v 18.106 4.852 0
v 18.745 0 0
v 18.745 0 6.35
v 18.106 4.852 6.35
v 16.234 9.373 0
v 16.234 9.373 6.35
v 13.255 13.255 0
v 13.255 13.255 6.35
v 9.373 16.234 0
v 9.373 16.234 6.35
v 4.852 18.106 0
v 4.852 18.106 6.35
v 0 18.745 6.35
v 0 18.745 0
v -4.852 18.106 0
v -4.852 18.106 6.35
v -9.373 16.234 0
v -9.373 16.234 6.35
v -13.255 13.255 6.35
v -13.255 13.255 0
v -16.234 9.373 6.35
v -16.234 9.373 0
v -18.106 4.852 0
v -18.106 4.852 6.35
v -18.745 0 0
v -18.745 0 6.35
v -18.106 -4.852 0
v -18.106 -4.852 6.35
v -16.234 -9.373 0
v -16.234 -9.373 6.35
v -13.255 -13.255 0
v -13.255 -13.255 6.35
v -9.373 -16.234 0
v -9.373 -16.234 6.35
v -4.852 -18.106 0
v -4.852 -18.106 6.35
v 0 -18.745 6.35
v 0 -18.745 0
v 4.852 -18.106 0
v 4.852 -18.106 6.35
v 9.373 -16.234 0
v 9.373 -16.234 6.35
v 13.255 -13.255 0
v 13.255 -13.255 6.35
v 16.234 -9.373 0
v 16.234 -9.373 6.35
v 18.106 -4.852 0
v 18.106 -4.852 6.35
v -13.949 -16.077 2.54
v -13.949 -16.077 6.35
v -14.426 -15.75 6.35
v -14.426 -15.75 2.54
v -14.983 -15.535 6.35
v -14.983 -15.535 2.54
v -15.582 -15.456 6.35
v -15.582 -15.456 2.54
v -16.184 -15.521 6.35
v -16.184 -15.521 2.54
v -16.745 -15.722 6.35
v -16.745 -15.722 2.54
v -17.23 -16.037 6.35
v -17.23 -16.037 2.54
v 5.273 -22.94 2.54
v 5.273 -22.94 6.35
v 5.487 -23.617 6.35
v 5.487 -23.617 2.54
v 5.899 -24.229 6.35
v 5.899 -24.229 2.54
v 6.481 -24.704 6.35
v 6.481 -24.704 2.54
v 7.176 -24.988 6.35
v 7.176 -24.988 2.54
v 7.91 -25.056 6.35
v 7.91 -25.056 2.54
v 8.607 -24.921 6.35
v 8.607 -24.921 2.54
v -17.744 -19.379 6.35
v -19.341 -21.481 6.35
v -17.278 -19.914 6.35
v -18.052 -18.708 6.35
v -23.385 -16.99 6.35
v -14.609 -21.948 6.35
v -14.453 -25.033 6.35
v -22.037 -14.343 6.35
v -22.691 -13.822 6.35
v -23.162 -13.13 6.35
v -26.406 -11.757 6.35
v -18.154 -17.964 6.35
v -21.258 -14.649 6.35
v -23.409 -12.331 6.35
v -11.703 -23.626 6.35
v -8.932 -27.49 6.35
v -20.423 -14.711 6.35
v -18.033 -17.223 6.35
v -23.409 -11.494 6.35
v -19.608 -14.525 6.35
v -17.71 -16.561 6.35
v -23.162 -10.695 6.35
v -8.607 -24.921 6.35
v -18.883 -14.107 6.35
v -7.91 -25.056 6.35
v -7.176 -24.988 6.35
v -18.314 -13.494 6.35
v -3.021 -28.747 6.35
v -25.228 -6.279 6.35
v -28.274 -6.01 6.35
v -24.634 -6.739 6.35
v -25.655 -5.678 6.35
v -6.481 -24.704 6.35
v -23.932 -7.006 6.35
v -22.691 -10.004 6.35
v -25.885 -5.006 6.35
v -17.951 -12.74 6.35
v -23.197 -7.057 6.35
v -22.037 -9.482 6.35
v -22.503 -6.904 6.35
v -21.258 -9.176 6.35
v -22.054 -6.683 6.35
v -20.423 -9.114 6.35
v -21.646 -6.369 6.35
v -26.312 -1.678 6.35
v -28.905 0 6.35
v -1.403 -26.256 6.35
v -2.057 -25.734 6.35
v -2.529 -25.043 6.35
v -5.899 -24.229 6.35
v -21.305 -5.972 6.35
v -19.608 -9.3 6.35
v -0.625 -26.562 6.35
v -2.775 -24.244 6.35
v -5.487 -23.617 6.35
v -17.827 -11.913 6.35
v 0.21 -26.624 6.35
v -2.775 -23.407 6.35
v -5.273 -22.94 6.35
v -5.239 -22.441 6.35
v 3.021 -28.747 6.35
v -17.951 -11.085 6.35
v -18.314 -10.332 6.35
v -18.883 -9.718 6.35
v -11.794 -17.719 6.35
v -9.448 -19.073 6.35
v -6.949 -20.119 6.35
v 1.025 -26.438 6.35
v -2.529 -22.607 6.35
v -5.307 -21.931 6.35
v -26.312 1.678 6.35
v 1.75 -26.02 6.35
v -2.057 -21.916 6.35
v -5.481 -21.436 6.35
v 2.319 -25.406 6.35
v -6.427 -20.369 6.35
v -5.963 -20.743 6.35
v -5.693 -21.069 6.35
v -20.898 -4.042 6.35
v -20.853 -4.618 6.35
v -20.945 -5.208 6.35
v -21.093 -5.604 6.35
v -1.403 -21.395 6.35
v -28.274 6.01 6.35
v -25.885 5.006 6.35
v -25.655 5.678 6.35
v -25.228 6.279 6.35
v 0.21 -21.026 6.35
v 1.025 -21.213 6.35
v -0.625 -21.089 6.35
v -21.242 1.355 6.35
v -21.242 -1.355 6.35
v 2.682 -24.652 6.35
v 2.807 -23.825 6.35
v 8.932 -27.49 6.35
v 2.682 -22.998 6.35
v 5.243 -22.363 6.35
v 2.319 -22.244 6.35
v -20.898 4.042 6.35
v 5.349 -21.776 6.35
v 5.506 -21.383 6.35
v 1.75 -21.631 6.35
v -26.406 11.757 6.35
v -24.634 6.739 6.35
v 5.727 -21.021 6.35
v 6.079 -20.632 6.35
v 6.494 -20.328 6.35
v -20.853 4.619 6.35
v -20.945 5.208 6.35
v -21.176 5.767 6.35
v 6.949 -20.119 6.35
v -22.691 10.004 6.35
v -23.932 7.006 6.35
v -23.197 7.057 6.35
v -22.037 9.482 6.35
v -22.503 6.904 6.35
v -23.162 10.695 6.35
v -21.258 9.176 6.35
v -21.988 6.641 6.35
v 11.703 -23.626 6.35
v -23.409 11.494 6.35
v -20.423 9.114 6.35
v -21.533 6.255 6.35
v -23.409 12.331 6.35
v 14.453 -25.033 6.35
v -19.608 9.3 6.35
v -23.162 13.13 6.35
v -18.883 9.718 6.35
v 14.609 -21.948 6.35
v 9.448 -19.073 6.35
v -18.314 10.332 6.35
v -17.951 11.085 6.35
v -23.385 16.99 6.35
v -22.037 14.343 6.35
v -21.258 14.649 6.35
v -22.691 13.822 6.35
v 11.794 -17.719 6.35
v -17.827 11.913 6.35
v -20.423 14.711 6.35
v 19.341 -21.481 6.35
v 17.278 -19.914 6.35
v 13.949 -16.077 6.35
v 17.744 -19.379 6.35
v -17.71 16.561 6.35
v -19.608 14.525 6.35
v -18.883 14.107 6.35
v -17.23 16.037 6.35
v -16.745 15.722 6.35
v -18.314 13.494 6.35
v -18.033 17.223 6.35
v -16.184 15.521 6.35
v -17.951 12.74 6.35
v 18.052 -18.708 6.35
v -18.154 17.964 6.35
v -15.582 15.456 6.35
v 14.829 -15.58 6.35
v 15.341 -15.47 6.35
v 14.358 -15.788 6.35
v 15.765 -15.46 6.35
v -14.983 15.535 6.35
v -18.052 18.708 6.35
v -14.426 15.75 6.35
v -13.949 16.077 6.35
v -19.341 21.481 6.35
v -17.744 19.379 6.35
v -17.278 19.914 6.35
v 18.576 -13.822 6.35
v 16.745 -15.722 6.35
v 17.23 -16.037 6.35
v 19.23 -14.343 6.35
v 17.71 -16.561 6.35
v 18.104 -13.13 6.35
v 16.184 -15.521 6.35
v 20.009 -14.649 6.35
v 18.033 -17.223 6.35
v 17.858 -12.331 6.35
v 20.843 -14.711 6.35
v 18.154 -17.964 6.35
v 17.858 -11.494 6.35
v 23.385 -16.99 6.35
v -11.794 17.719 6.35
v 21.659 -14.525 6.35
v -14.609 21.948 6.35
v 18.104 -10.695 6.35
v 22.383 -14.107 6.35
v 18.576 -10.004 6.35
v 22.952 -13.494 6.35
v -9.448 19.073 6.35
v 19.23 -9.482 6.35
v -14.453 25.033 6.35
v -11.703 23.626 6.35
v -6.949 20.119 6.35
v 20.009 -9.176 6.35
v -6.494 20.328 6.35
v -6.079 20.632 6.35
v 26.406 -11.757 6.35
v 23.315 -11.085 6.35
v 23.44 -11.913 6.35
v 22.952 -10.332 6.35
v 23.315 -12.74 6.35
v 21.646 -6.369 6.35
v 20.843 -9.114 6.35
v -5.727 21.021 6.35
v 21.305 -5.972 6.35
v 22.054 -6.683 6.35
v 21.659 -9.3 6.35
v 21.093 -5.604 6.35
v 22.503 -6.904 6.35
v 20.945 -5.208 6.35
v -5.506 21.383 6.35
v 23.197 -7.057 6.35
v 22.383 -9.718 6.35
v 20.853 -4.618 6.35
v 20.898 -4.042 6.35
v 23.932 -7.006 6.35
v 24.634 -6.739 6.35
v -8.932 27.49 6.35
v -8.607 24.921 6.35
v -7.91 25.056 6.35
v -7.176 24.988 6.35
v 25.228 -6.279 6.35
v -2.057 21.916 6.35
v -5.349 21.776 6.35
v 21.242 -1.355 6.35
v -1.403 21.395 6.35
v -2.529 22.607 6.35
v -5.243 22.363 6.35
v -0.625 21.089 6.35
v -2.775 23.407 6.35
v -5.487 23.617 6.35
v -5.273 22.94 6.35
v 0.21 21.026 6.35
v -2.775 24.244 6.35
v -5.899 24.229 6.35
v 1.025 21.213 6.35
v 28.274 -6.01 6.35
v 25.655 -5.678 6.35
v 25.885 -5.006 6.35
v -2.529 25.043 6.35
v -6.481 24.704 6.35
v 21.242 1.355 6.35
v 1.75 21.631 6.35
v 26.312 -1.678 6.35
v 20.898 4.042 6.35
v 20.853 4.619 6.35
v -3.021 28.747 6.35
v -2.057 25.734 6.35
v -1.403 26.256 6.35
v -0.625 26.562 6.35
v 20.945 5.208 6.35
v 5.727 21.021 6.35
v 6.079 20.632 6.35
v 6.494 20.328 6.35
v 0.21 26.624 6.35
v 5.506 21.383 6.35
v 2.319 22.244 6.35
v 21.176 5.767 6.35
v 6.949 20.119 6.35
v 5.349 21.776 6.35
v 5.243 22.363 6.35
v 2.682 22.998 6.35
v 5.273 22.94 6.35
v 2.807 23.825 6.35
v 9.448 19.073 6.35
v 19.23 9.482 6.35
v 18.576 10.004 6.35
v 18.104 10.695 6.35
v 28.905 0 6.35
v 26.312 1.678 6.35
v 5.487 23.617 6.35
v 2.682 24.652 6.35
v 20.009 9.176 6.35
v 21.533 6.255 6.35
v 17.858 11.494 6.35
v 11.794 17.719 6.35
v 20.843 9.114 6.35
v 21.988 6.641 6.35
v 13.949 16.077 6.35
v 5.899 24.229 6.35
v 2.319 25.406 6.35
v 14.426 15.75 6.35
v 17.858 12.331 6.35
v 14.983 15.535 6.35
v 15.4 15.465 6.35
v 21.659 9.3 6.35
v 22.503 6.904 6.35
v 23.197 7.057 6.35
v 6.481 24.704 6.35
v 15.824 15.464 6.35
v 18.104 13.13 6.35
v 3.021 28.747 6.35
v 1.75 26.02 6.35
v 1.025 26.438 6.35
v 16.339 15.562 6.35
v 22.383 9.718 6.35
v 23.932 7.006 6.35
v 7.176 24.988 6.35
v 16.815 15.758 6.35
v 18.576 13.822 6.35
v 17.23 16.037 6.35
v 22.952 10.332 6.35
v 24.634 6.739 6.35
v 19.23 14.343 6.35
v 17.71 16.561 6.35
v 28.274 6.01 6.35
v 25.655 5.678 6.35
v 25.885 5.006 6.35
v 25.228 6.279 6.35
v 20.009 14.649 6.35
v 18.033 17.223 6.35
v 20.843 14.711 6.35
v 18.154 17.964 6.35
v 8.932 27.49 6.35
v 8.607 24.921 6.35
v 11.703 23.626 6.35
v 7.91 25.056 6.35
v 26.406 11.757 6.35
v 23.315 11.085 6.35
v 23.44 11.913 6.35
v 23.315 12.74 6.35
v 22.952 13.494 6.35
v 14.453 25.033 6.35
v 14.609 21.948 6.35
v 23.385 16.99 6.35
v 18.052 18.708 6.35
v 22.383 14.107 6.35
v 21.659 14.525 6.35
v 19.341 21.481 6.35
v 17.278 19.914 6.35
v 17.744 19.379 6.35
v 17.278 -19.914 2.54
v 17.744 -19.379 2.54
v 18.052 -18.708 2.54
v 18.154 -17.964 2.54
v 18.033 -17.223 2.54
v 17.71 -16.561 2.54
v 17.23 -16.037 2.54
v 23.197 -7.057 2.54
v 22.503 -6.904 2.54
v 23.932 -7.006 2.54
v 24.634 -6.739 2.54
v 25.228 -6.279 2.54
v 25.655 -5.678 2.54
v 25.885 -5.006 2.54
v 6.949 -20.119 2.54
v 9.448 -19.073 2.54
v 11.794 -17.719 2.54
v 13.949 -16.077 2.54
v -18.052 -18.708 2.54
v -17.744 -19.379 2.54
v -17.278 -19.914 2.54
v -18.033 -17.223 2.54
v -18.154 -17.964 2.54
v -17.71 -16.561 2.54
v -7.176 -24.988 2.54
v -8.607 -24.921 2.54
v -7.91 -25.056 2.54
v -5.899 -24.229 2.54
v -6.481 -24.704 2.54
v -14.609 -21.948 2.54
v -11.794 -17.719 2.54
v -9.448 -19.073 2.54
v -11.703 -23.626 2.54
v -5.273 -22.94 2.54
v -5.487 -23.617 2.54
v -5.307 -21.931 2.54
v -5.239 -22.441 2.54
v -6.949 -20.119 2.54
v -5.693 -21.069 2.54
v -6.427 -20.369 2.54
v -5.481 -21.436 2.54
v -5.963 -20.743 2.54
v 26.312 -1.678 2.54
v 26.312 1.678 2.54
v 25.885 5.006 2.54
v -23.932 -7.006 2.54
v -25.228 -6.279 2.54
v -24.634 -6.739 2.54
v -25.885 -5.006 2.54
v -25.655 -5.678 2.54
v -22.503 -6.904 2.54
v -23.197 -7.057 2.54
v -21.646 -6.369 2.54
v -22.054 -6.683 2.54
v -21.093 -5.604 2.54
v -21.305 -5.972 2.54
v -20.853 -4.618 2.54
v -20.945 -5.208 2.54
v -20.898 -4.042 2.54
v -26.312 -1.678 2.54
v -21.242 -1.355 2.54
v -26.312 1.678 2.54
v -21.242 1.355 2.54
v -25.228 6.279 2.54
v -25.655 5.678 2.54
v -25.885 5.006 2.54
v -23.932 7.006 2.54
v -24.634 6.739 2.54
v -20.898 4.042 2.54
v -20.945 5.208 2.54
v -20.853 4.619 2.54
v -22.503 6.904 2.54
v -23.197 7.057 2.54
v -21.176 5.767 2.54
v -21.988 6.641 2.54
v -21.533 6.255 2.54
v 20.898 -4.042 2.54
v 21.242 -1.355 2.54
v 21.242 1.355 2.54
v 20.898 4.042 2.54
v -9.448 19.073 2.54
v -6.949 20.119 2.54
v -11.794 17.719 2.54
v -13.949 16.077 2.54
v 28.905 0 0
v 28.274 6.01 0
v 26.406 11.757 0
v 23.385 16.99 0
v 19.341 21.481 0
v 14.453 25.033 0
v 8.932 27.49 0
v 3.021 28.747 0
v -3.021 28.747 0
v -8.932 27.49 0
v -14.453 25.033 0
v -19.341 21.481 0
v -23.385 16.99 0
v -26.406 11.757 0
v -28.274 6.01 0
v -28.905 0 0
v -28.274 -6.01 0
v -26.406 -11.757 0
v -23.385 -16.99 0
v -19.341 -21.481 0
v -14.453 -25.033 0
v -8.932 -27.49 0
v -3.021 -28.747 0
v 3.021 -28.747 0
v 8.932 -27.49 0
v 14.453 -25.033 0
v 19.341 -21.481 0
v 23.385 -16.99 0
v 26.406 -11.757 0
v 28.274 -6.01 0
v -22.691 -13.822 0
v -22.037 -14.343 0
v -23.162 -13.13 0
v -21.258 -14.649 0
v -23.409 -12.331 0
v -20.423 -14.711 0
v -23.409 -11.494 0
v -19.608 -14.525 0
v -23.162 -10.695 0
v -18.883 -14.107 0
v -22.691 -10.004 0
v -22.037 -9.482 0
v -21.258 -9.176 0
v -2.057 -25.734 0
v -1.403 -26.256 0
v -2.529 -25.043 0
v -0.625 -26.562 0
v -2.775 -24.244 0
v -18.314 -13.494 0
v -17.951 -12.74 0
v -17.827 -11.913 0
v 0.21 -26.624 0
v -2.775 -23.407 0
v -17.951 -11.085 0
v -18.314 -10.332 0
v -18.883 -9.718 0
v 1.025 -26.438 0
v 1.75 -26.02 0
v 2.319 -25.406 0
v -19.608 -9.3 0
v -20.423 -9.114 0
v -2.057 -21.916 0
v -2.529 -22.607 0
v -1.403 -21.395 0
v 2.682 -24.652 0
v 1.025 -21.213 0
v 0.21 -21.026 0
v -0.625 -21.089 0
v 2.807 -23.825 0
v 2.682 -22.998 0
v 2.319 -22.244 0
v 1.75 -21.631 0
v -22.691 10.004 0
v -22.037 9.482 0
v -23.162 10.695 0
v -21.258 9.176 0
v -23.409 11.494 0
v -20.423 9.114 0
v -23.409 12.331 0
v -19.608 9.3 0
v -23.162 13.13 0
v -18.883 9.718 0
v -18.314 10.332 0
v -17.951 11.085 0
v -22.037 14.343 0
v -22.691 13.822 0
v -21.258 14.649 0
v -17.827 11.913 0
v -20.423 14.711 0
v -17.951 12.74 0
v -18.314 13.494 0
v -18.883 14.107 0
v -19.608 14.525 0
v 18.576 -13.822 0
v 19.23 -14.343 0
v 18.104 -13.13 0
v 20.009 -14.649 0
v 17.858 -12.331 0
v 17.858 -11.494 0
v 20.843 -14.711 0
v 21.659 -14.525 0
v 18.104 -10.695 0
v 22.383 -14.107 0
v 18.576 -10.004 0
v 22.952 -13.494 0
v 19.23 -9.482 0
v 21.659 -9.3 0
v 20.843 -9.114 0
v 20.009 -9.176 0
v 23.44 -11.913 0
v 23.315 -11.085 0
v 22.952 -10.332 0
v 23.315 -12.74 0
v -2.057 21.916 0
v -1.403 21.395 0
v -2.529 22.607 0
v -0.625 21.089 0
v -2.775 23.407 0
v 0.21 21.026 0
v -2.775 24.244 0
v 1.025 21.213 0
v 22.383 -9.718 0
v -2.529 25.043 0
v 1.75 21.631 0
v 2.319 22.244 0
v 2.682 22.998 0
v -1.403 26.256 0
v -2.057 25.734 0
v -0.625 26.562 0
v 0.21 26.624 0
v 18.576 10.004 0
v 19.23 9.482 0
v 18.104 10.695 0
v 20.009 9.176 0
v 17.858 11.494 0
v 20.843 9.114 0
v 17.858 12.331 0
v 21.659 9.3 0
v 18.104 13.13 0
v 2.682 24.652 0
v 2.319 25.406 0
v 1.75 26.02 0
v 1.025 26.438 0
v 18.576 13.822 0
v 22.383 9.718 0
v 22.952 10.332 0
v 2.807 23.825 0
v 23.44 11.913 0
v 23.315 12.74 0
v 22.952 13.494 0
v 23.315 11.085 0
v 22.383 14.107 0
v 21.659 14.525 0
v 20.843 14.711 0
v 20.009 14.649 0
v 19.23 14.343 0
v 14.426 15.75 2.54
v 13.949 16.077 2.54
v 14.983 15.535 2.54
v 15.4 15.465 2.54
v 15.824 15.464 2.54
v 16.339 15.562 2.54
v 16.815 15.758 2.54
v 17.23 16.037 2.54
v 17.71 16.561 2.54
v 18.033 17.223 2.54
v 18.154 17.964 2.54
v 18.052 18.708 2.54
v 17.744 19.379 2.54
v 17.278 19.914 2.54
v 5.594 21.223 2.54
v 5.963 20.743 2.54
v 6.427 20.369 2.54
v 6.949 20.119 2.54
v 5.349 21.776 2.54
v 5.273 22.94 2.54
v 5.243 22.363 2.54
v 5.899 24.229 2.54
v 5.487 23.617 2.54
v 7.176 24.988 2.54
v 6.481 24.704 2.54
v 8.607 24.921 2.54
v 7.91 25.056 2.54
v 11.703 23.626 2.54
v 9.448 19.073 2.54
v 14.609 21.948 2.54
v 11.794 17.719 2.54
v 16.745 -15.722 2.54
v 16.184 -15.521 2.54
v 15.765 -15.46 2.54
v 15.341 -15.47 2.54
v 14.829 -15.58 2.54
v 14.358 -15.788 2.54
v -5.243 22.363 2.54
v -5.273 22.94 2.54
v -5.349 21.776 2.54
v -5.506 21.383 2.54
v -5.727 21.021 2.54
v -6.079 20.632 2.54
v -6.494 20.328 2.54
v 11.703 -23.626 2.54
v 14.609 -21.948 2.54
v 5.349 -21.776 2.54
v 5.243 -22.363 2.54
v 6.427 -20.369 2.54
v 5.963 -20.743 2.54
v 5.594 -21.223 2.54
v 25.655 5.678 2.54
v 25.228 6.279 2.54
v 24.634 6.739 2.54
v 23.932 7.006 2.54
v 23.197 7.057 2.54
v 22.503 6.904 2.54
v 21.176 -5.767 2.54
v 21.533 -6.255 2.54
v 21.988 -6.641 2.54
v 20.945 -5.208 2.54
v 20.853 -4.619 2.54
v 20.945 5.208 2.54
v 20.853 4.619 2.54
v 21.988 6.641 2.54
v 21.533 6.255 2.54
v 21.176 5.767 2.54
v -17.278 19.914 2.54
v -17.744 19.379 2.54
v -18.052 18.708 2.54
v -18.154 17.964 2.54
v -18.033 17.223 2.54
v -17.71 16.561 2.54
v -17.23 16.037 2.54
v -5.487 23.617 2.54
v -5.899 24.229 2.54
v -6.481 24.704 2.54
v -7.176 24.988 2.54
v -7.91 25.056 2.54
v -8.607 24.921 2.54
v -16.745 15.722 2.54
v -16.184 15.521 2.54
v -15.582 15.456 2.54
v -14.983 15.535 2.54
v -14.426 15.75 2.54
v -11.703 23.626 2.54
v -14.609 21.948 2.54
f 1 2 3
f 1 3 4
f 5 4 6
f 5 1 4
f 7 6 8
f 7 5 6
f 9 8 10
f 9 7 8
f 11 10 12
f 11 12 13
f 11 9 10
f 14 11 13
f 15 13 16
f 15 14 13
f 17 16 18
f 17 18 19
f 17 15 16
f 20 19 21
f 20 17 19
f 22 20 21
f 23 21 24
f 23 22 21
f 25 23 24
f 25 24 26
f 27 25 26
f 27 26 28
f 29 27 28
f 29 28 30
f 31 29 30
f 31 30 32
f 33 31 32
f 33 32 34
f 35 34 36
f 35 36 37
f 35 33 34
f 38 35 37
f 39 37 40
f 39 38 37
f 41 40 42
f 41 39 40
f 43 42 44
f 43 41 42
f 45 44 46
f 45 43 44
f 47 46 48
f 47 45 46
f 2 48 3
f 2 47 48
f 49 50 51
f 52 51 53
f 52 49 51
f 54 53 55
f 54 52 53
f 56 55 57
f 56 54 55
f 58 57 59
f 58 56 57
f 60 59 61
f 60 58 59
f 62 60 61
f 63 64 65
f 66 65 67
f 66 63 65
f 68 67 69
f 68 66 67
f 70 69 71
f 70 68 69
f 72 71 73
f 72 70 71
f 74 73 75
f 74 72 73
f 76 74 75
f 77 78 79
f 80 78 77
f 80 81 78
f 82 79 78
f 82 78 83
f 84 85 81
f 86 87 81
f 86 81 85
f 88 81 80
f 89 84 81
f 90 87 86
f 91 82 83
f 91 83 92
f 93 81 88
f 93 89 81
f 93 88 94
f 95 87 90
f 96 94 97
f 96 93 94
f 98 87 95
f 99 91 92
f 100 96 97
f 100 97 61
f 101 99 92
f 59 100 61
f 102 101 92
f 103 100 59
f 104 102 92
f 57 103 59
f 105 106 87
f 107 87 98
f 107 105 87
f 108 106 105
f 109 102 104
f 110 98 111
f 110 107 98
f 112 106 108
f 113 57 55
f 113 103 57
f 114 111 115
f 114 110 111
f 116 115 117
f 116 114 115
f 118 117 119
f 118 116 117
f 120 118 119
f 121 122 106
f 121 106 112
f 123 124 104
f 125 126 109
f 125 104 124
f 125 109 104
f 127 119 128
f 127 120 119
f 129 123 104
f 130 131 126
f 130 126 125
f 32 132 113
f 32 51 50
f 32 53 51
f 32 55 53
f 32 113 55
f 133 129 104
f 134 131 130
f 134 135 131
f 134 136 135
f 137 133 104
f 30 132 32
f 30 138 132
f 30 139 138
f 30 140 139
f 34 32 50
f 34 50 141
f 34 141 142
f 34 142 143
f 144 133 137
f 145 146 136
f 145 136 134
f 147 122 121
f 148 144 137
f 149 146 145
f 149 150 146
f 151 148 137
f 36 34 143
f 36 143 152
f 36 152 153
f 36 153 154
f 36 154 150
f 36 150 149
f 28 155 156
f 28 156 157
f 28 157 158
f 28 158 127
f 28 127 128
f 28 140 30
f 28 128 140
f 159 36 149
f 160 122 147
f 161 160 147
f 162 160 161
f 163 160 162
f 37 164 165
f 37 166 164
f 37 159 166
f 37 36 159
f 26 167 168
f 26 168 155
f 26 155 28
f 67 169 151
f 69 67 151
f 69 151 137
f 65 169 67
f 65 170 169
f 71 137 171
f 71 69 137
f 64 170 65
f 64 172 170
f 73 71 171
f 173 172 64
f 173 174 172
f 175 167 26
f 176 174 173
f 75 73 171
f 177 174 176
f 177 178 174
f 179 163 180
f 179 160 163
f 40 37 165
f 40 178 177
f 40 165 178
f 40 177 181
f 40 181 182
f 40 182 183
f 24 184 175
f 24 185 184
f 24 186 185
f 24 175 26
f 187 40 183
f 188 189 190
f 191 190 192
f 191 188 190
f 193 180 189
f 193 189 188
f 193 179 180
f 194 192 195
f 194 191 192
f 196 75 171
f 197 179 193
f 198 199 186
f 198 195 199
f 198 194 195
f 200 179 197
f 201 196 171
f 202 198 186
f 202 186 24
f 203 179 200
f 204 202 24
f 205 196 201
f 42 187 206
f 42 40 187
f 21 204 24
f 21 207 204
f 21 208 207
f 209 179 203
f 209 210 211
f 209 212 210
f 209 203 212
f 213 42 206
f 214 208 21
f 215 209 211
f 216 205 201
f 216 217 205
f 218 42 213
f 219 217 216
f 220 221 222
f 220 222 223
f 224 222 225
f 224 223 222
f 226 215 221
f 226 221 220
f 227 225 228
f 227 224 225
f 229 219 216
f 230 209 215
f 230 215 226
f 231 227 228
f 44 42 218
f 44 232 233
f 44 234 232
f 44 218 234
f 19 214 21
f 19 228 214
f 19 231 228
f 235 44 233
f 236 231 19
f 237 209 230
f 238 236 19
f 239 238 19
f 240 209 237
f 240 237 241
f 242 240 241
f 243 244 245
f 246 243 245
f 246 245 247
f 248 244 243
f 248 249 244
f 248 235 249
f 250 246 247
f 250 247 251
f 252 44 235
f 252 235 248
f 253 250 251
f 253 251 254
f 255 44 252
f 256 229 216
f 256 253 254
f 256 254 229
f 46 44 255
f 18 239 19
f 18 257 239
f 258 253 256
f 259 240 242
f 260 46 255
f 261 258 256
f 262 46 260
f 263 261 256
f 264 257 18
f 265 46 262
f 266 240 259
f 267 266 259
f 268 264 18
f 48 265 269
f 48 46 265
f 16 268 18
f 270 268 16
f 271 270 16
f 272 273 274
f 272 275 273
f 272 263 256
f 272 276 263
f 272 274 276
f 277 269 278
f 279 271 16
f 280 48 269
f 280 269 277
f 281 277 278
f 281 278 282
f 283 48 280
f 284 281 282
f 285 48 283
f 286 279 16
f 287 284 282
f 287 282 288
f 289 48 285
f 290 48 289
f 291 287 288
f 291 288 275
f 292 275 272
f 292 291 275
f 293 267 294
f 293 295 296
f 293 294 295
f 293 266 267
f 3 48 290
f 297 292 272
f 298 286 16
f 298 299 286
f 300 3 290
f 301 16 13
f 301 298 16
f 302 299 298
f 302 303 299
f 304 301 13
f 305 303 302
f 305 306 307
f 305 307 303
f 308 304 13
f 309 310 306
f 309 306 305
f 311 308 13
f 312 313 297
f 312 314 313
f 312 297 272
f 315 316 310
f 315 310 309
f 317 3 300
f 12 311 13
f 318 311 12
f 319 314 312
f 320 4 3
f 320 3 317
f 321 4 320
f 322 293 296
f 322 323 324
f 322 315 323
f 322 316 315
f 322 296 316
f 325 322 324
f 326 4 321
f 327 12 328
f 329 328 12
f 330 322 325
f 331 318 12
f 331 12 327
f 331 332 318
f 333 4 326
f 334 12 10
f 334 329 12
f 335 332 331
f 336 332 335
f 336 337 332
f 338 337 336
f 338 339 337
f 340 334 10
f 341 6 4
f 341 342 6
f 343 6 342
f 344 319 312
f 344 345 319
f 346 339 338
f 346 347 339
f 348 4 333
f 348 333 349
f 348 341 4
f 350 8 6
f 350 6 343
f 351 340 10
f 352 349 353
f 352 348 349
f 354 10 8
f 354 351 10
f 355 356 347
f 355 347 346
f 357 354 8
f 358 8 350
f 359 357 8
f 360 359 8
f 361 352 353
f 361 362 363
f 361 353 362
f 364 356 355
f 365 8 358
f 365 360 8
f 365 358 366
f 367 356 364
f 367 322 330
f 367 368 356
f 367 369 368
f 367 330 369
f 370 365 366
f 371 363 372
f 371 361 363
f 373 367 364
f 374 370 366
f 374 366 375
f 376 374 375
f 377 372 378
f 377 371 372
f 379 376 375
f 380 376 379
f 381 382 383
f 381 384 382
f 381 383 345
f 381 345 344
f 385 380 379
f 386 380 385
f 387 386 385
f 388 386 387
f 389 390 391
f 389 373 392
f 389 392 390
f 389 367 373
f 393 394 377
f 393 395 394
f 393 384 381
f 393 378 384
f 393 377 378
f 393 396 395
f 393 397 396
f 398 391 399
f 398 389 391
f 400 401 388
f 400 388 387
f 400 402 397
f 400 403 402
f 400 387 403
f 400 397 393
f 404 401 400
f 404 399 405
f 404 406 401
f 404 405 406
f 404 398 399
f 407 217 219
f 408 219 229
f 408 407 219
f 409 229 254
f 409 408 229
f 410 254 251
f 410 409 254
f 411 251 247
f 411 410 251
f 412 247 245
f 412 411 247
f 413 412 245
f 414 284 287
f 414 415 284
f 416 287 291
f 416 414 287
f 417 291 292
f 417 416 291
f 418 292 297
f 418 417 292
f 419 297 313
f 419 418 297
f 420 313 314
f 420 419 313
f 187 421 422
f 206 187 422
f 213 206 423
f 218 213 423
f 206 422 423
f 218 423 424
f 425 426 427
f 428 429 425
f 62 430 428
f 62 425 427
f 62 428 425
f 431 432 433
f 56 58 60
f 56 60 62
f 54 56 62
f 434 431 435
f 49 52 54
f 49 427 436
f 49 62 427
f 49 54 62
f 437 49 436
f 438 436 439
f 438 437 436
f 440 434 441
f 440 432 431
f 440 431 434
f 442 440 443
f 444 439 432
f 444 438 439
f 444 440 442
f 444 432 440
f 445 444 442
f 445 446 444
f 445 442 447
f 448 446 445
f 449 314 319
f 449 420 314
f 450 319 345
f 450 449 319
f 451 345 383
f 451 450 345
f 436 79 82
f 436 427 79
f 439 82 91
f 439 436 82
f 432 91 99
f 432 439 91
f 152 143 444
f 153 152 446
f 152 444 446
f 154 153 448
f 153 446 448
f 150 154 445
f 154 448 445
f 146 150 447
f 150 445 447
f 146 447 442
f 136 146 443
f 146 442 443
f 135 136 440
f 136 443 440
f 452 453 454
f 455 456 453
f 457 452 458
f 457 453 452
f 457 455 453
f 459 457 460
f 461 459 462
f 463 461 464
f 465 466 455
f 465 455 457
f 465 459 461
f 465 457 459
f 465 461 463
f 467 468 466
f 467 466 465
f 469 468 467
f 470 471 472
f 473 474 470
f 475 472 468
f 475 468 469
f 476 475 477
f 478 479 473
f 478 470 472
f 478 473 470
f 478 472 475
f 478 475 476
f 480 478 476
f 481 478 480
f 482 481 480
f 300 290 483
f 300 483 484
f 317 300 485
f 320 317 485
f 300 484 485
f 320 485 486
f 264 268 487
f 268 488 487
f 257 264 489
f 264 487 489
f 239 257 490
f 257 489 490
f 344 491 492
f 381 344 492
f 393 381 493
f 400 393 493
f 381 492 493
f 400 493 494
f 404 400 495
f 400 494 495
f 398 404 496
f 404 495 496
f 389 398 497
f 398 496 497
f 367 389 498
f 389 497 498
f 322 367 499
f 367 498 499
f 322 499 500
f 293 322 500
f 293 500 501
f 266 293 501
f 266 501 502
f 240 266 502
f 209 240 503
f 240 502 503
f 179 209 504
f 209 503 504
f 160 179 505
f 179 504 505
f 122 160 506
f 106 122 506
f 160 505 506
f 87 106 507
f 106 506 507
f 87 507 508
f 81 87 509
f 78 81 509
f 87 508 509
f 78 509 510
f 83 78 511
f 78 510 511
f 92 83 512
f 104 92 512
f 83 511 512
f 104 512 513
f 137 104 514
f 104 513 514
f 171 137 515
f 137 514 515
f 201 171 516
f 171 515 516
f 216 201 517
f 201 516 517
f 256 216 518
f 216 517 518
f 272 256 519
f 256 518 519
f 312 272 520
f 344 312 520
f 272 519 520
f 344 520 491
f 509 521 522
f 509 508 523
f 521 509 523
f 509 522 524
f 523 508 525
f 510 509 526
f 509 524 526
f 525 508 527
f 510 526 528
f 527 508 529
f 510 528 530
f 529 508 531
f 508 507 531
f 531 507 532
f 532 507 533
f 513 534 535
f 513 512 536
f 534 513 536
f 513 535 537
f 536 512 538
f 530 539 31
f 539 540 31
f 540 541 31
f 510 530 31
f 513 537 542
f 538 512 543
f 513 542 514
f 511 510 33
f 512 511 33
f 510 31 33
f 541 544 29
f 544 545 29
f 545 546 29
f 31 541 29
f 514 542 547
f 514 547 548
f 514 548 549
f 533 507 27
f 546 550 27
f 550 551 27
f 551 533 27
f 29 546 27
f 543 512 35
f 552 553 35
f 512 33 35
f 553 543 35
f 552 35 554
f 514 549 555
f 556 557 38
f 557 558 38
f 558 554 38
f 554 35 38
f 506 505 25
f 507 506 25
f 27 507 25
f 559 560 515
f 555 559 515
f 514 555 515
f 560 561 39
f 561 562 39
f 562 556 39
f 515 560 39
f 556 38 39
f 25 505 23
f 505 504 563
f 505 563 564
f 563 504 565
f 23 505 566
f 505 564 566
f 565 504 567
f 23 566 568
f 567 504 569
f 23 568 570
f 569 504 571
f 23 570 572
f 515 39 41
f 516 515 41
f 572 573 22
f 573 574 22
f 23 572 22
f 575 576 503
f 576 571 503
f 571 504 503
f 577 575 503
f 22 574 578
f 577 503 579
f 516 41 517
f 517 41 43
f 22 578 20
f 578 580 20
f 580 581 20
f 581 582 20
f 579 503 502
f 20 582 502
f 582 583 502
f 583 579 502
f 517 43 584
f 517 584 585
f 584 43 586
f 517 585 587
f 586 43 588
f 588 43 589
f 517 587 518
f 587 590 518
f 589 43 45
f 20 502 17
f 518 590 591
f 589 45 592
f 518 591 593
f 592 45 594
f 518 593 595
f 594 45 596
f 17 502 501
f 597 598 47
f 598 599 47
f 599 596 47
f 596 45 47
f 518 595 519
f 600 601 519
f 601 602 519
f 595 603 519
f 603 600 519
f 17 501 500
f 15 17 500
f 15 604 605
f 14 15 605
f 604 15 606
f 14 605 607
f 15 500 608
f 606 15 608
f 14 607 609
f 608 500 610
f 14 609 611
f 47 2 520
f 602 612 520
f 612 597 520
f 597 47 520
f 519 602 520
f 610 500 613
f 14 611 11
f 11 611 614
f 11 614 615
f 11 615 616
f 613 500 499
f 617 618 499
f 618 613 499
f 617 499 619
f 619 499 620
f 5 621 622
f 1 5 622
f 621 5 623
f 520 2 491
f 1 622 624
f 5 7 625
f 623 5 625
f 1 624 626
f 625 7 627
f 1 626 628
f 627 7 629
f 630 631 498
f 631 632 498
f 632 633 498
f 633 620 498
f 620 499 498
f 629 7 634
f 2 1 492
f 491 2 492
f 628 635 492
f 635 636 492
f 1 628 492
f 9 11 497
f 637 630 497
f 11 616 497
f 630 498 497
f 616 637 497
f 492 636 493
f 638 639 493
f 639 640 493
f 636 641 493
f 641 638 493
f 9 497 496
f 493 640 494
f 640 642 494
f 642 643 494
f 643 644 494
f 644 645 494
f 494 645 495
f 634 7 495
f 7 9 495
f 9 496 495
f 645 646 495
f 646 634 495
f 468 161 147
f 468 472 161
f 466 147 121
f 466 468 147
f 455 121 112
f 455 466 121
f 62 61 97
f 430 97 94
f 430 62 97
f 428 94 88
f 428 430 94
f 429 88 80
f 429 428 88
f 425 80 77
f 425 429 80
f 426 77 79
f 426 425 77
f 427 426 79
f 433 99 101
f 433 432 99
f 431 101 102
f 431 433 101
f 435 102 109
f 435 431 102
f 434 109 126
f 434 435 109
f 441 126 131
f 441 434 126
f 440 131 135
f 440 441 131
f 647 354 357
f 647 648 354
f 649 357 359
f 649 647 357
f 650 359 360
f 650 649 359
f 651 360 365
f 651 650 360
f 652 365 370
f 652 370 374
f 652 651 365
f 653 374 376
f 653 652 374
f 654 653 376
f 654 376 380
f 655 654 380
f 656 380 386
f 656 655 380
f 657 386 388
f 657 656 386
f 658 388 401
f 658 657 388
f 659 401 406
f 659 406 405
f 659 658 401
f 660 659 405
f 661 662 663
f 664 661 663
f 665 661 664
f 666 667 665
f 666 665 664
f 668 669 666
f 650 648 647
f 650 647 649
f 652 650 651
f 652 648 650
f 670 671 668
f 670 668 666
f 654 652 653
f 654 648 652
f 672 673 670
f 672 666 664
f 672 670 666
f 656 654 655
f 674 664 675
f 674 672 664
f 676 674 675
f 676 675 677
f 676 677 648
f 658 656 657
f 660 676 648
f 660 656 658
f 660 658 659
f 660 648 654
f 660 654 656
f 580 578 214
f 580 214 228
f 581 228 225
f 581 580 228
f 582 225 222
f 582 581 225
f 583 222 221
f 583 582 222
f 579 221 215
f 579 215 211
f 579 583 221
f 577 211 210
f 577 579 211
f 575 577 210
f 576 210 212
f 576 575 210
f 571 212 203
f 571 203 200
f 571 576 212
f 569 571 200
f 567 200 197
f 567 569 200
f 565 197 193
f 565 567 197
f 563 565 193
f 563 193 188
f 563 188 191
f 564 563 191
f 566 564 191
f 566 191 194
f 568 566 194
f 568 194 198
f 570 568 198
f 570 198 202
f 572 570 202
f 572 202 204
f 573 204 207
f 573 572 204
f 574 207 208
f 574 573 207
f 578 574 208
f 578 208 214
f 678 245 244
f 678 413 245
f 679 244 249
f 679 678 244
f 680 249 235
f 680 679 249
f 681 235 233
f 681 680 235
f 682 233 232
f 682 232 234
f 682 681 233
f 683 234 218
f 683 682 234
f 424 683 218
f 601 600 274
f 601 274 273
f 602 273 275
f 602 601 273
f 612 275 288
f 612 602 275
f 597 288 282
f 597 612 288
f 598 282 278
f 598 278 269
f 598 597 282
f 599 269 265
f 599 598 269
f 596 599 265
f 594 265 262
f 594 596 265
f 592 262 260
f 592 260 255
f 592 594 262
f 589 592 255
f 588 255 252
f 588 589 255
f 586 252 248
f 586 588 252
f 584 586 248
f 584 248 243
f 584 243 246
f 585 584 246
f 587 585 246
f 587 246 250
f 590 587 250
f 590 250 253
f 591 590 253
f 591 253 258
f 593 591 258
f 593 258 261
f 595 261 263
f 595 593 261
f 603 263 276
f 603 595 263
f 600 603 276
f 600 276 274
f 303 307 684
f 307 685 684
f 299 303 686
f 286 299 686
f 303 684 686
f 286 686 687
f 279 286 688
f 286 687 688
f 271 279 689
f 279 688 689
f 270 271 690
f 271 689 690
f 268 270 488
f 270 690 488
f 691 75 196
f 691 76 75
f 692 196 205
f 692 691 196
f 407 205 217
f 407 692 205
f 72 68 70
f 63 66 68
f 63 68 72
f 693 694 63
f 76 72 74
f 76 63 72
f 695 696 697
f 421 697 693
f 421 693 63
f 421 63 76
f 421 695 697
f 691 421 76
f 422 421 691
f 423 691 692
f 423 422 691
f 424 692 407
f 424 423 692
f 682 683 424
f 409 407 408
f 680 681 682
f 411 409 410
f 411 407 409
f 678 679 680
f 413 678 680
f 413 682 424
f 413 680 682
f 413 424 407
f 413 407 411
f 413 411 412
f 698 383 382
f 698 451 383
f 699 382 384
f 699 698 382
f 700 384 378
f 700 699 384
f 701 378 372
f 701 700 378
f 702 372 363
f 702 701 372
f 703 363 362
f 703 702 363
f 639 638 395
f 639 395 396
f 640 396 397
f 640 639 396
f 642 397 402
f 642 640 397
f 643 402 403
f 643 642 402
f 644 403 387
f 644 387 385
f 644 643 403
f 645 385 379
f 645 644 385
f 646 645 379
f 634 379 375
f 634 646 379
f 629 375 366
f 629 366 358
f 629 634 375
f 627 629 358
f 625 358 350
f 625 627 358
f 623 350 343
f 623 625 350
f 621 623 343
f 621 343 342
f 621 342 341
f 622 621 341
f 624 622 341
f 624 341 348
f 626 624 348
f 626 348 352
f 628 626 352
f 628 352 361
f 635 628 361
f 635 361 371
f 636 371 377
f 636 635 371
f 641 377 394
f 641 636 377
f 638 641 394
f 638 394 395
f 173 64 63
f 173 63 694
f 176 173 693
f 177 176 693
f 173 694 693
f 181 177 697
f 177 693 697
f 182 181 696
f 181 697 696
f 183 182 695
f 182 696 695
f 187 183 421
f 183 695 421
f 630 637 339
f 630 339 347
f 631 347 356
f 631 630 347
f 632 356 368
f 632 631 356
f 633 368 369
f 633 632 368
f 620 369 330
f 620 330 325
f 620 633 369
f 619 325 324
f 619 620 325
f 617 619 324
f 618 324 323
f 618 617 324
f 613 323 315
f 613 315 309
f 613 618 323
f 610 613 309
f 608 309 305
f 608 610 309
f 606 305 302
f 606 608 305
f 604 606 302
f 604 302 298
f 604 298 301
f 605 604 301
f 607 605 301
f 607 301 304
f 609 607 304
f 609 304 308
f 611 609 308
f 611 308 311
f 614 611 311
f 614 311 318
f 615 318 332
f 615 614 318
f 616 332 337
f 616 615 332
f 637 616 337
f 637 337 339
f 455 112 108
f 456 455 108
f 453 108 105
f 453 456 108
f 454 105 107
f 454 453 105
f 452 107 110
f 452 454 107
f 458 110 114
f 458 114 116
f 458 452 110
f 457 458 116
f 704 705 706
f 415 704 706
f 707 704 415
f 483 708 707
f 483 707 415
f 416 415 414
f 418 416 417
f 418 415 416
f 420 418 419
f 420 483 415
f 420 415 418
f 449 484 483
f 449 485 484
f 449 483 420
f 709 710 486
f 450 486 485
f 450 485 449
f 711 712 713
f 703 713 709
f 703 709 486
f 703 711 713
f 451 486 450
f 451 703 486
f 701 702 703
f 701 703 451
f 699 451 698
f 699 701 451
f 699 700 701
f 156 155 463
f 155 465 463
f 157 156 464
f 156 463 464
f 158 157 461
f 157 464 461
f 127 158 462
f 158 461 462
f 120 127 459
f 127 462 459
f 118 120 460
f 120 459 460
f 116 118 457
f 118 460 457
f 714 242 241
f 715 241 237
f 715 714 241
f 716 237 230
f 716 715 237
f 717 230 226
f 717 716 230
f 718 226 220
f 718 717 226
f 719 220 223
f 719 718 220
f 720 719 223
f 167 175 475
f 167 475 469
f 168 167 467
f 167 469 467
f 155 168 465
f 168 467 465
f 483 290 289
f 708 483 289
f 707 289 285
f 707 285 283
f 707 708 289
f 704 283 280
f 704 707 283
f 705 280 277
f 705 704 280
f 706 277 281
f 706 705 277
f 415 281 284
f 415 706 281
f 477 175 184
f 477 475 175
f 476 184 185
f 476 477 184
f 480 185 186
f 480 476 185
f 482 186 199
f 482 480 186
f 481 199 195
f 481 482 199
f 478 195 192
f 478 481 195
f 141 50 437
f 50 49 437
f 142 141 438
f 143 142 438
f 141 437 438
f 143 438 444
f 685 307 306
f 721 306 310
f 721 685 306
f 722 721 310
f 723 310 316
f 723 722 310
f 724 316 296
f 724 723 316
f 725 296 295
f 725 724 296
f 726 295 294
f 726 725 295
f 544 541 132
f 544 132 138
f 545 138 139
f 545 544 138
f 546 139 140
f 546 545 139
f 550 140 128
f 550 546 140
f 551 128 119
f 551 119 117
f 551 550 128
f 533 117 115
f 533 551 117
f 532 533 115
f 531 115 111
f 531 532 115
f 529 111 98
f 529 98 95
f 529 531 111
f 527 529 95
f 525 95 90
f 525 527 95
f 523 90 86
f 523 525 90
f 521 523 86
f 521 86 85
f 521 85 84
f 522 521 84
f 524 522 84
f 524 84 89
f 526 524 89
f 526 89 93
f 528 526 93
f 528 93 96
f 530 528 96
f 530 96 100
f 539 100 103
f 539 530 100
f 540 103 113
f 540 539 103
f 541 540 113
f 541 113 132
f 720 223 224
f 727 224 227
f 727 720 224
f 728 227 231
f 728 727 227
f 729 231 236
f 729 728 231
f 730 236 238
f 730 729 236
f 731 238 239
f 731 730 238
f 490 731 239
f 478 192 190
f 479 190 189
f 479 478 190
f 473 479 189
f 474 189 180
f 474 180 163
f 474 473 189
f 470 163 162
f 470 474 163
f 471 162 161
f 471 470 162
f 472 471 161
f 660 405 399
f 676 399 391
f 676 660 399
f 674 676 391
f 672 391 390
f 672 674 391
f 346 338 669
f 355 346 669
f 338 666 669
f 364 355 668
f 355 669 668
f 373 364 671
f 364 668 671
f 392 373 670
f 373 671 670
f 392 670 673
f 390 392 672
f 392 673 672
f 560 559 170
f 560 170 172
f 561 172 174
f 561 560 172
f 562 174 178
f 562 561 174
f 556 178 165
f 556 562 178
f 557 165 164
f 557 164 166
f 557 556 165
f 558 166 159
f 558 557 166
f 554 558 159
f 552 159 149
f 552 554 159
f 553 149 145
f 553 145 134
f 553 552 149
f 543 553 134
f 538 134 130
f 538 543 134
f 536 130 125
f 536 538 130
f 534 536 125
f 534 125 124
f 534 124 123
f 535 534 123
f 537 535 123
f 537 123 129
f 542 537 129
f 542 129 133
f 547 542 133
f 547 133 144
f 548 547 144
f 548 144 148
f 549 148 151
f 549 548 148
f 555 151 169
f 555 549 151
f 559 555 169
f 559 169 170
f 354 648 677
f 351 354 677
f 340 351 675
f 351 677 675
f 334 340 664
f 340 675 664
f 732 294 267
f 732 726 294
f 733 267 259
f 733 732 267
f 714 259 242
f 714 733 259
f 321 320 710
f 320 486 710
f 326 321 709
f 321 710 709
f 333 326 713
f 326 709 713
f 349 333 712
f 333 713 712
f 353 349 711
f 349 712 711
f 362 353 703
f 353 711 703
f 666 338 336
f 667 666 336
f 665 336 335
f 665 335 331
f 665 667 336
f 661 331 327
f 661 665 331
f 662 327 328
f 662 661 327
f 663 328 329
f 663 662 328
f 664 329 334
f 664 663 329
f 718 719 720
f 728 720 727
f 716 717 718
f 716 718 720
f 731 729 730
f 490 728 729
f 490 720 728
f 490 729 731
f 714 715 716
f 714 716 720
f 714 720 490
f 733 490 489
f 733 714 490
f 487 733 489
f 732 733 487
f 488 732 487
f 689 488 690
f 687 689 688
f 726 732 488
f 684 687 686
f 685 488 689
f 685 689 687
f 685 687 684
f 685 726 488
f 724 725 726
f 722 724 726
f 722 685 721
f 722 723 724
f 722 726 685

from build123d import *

# Parameters (mm, degrees)
SKETCH1_R           = 28.9052
SKETCH1_R_2         = 2.8067
SKETCH1_R_3         = 18.7452
BOSS_EXTRUDE1_DEPTH = 6.35
SHELL1_T            = -2.54
FILLET1_R           = 2.54


with BuildPart() as part:
    # Sketch1 → Boss-Extrude1 (new body)
    with BuildSketch(Plane.XY):
        Circle(SKETCH1_R)
        with Locations((0, 23.8252)):
            Circle(SKETCH1_R_2, mode=Mode.SUBTRACT)
        with Locations((20.63322845, 11.9126)):
            Circle(SKETCH1_R_2, mode=Mode.SUBTRACT)
        with Locations((20.63322845, -11.9126)):
            Circle(SKETCH1_R_2, mode=Mode.SUBTRACT)
        with Locations((0, -23.8252)):
            Circle(SKETCH1_R_2, mode=Mode.SUBTRACT)
        with Locations((-20.63322845, -11.9126)):
            Circle(SKETCH1_R_2, mode=Mode.SUBTRACT)
        with Locations((-20.63322845, 11.9126)):
            Circle(SKETCH1_R_2, mode=Mode.SUBTRACT)
        Circle(SKETCH1_R_3, mode=Mode.SUBTRACT)
    extrude(amount=BOSS_EXTRUDE1_DEPTH)

    # Shell1
    shell1_openings = [part.faces().sort_by_distance(p)[0] for p in [
        (-28.087637483, 0, 6.35),
    ]]
    offset(amount=SHELL1_T, openings=shell1_openings)

    # Fillet1
    fillet1_edges = [part.edges().sort_by_distance(p)[0] for p in [
        (20.242549419, -6.580192403, 4.445),
        (15.819888492, -14.240465833, 4.445),
        (24.894348466, -8.683040107, 4.445),
        (19.966907548, -17.217618129, 4.445),
        (24.894348466, 8.683040107, 4.445),
        (19.966907548, 17.217618129, 4.445),
        (20.242549419, 6.580192403, 4.445),
        (15.819888492, 14.240465833, 4.445),
        (-4.927440918, -25.900658236, 4.445),
        (4.927440918, -25.900658236, 4.445),
        (-4.422660927, -20.820658236, 4.445),
        (4.422660927, -20.820658236, 4.445),
        (-24.894348466, -8.683040107, 4.445),
        (-19.966907548, -17.217618129, 4.445),
        (-20.242549419, -6.580192403, 4.445),
        (-15.819888492, -14.240465833, 4.445),
        (-24.894348466, 8.683040107, 4.445),
        (-19.966907548, 17.217618129, 4.445),
        (-20.242549419, 6.580192403, 4.445),
        (-15.819888492, 14.240465833, 4.445),
        (-4.422660927, 20.820658236, 4.445),
        (4.422660927, 20.820658236, 4.445),
        (-4.927440918, 25.900658236, 4.445),
        (4.927440918, 25.900658236, 4.445),
    ]]
    fillet(fillet1_edges, radius=FILLET1_R - 0.0001)  # a hair under: the kernel refuses the full size


solid = part.part
